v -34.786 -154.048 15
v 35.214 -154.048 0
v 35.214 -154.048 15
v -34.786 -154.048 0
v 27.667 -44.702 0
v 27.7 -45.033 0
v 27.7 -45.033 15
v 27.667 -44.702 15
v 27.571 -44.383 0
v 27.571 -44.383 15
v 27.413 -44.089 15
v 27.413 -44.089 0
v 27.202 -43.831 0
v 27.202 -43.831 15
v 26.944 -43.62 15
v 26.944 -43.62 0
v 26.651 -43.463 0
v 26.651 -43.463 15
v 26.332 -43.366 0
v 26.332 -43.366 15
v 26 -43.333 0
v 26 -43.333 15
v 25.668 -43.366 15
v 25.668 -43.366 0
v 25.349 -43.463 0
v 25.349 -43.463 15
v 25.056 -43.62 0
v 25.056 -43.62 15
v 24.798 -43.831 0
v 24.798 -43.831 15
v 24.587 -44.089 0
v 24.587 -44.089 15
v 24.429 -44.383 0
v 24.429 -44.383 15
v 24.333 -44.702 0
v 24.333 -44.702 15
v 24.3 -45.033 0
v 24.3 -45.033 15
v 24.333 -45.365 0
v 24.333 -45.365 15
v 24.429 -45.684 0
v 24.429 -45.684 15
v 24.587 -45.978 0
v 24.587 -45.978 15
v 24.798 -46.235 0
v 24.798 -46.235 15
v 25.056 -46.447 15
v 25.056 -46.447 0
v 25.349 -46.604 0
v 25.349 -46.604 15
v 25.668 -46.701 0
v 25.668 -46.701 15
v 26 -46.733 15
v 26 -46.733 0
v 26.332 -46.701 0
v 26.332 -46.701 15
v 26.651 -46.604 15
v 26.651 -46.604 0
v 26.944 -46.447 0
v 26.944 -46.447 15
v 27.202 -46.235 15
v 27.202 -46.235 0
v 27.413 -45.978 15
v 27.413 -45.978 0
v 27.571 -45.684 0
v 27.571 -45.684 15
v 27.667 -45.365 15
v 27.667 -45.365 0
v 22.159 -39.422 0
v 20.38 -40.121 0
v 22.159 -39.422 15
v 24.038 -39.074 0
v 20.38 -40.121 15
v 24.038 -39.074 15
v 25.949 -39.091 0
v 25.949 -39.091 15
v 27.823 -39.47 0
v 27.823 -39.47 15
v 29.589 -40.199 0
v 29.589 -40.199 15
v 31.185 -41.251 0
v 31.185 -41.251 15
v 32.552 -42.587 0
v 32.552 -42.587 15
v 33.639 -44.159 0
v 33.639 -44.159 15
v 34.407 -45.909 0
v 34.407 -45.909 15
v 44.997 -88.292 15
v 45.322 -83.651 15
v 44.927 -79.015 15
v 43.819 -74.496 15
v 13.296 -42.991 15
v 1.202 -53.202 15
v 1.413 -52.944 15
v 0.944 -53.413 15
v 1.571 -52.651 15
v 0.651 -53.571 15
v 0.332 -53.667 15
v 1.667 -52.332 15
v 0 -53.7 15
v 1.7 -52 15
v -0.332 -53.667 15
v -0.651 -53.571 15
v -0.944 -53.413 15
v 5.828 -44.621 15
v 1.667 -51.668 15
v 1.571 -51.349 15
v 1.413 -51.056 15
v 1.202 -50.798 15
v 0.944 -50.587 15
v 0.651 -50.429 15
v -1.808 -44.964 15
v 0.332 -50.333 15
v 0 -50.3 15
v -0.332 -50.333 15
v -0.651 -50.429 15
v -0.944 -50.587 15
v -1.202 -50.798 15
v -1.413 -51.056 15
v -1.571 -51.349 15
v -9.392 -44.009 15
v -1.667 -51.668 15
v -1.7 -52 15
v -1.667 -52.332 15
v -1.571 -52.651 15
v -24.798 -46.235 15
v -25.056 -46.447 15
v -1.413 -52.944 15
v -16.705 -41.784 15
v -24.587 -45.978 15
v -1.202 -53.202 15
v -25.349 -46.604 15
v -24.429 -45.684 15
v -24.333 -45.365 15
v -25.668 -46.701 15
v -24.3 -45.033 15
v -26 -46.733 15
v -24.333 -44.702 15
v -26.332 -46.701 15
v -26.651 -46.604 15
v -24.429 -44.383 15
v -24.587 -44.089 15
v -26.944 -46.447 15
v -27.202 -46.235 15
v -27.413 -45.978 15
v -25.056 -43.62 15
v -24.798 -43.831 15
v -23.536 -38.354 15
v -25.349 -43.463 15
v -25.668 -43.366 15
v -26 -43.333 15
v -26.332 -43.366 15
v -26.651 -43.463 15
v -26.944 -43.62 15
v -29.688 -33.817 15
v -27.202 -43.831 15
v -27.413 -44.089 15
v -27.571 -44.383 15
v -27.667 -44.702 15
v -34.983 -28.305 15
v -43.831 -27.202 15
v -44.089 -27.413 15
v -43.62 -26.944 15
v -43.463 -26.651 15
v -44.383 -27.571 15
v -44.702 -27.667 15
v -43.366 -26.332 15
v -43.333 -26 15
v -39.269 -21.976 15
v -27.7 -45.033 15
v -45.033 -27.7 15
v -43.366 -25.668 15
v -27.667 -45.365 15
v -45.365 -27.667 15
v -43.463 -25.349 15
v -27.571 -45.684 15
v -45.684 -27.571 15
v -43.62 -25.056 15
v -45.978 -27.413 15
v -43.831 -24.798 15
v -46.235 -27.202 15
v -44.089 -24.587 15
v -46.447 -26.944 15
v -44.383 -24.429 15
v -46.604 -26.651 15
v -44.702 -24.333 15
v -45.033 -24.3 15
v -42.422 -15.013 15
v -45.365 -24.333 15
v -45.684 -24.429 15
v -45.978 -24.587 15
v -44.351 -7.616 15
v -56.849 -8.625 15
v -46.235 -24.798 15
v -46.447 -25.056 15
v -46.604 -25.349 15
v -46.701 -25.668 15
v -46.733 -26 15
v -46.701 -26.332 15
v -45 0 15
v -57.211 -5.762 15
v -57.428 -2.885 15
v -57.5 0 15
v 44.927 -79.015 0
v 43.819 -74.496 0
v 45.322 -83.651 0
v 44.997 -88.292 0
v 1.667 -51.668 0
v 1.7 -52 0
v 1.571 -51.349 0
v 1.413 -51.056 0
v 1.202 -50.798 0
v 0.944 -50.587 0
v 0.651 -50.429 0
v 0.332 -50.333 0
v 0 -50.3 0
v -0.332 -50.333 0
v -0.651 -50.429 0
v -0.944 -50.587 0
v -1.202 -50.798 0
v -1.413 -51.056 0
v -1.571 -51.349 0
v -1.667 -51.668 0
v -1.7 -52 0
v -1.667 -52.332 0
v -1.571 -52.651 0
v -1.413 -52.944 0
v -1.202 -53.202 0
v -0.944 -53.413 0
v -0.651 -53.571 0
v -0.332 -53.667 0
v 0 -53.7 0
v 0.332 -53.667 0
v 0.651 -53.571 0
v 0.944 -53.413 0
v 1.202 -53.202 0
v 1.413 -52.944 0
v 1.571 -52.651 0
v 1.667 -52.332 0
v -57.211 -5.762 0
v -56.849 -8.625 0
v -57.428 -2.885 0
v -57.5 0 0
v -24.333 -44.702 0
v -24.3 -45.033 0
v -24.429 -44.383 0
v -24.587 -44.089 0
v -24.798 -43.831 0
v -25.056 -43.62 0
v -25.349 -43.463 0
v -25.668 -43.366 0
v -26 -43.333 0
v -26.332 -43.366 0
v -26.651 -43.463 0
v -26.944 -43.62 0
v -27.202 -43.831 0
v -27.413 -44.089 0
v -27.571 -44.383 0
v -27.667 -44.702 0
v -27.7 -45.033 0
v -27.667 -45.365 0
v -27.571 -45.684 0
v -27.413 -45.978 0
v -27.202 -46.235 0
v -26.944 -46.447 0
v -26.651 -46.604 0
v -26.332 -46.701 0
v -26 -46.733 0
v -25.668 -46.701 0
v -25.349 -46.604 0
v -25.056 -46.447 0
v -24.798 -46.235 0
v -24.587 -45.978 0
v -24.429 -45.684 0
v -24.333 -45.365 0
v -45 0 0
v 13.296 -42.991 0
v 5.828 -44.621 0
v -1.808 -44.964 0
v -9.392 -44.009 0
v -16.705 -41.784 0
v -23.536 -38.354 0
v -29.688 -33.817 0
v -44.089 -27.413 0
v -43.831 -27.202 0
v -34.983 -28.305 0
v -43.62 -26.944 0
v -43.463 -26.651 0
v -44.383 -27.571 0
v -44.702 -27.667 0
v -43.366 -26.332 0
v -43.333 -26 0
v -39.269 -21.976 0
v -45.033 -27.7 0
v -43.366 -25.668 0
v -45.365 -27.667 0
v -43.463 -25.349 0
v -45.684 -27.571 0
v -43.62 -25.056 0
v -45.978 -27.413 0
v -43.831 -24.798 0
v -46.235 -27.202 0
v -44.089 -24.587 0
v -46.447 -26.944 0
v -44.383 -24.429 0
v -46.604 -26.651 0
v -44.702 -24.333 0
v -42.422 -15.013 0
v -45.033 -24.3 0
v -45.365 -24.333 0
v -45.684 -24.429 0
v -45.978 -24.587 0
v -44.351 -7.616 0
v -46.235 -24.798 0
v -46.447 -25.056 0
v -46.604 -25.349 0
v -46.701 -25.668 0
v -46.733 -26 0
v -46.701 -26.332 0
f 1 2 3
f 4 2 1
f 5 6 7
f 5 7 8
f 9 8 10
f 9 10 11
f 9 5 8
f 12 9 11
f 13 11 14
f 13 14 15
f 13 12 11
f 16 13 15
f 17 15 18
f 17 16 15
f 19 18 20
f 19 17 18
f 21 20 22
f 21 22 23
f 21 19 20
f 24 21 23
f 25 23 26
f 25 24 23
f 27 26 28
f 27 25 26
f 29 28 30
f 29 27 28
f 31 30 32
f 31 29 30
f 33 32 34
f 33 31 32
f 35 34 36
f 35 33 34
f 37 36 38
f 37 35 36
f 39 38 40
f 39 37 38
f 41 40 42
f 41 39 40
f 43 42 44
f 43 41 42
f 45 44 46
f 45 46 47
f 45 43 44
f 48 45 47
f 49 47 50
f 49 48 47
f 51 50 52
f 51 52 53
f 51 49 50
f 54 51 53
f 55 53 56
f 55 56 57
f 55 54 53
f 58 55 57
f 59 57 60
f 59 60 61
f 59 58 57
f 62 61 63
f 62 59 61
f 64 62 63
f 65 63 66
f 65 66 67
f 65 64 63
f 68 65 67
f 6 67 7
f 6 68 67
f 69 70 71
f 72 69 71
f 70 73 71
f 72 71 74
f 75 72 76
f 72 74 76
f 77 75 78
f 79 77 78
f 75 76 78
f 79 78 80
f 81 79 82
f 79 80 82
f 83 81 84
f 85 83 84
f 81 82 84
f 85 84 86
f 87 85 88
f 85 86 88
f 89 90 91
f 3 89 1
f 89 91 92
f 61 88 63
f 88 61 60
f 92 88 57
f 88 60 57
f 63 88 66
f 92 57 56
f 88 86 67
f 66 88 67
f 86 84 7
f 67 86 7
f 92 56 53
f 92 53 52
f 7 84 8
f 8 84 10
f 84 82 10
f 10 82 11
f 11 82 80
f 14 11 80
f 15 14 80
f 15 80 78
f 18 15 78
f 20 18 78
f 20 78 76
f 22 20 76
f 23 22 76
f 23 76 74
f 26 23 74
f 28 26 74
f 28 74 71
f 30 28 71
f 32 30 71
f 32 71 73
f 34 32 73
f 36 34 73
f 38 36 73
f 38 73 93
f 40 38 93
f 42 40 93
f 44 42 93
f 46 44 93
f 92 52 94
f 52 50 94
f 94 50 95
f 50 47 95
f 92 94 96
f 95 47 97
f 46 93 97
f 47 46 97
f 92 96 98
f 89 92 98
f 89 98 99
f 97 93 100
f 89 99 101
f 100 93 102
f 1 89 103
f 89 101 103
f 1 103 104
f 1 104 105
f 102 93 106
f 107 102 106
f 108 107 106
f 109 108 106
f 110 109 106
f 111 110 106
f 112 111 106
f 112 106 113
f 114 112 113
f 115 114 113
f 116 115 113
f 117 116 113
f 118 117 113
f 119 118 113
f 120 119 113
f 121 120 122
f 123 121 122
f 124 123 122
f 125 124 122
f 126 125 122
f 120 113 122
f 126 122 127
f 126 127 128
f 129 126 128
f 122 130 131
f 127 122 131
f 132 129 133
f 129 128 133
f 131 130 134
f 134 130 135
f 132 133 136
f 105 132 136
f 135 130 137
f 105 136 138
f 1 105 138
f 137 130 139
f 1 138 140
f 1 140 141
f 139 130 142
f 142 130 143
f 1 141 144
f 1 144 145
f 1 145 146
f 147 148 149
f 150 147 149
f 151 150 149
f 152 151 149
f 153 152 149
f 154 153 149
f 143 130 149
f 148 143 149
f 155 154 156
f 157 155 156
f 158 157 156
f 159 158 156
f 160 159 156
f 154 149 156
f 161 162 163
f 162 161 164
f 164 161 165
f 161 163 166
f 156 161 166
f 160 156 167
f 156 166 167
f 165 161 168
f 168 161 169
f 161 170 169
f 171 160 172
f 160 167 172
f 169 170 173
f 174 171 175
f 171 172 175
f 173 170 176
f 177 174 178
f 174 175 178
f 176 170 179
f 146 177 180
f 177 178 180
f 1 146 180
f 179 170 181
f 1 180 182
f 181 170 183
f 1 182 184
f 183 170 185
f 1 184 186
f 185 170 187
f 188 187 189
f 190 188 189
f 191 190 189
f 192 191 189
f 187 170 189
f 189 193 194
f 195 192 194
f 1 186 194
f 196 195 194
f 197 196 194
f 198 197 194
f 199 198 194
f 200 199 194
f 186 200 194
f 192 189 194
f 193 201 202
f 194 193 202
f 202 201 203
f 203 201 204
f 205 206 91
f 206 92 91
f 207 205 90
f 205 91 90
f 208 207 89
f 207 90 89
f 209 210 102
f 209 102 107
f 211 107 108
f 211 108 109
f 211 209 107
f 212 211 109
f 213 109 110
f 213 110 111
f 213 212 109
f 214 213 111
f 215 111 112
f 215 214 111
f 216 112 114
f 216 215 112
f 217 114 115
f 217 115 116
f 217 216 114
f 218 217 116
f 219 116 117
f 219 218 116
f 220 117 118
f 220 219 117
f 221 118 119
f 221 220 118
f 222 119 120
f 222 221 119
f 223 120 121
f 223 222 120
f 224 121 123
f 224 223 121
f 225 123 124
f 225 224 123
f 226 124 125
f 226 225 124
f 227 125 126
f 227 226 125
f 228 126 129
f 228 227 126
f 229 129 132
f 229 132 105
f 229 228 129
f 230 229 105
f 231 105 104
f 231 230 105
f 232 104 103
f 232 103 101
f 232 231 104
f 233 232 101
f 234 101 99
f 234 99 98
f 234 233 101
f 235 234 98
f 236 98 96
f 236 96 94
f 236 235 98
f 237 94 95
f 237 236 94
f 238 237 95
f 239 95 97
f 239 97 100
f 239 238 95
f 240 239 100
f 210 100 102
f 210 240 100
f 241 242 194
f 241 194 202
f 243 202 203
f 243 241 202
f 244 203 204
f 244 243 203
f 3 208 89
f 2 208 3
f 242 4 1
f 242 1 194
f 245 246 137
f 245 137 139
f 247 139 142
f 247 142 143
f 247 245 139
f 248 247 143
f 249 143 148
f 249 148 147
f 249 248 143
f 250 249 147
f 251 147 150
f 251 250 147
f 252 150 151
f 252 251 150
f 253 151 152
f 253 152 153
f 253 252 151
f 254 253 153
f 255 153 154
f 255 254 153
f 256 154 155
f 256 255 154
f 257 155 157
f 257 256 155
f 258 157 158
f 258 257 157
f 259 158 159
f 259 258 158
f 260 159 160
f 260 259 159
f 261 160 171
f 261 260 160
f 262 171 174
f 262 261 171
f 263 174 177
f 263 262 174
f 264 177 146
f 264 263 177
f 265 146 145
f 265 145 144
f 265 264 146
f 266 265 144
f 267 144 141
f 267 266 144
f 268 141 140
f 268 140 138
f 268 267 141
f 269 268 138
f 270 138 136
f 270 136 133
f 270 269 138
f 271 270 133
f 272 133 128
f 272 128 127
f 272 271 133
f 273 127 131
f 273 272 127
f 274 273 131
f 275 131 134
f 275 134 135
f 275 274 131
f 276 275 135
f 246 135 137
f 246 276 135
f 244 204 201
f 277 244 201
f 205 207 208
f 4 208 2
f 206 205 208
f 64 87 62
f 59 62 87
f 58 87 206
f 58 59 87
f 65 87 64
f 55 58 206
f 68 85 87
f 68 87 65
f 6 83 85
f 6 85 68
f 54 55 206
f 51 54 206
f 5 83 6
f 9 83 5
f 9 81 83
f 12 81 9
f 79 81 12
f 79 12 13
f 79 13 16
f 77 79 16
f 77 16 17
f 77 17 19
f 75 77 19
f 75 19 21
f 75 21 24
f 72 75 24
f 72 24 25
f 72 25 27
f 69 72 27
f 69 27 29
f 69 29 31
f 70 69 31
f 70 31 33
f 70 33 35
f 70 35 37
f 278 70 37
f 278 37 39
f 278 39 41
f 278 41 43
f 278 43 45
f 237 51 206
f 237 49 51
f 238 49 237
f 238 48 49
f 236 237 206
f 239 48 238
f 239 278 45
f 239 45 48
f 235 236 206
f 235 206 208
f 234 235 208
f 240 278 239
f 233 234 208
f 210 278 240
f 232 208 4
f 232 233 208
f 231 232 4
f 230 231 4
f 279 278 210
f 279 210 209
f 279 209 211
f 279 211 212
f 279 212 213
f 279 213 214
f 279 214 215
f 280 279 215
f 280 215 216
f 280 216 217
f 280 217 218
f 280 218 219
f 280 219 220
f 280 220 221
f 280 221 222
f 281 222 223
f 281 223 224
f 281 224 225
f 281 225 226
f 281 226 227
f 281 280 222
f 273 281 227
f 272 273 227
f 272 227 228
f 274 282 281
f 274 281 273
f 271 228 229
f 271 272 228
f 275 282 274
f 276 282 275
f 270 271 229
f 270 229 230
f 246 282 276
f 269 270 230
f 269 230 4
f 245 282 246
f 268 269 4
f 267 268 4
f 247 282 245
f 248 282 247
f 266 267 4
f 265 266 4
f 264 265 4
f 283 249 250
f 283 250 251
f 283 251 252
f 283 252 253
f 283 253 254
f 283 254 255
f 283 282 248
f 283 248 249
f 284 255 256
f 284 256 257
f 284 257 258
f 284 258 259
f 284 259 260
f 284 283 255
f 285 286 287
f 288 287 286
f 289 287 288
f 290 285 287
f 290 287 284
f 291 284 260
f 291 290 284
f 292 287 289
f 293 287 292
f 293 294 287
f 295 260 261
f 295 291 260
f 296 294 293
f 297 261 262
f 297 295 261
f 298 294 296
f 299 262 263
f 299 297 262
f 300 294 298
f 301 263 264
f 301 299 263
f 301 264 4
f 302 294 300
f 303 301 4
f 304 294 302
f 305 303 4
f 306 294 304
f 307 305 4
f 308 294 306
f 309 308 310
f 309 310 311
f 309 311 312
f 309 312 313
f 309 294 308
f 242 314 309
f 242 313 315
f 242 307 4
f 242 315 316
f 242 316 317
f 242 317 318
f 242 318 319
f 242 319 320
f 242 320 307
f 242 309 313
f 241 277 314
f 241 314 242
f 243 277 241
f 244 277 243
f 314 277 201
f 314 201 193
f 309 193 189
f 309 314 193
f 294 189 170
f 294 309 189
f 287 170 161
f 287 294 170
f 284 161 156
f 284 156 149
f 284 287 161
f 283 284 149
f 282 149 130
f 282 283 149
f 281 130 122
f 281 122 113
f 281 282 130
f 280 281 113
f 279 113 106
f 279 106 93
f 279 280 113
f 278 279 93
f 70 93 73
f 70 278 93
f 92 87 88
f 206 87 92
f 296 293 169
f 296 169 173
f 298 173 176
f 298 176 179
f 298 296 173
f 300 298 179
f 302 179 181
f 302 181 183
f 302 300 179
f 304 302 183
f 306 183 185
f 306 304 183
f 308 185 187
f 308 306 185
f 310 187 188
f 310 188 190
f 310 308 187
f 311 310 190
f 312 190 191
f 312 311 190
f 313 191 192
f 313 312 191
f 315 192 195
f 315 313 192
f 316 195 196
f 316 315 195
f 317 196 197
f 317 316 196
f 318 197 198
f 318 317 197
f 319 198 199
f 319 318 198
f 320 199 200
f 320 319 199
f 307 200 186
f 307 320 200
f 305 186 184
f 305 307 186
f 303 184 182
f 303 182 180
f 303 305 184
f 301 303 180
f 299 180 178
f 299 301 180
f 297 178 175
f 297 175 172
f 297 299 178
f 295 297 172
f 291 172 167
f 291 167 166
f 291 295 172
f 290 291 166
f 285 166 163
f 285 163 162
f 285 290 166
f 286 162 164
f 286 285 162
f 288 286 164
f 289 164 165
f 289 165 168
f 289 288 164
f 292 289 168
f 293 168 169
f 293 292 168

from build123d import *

# Parameters (mm, degrees)
SKETCH1_R           = 1.7
BOSS_EXTRUDE1_DEPTH = 15
FILLET1_R           = 10
FILLET2_R           = 30


with BuildPart() as part:
    # Sketch1 → Boss-Extrude1 (new body)
    with BuildSketch(Plane.XY):
        with BuildLine():
            Line((-57.5, 0), (-45, 0))
            ThreePointArc((-45, 0), (-18.212102581, -41.149961356), (30.258636425, -33.307880775))
            Line((30.258636425, -33.307880775), (46.0437747, -81.254716073))
            Line((46.0437747, -81.254716073), (35.213577586, -154.047675233))
            Line((35.213577586, -154.047675233), (-34.786422414, -154.047675233))
            Line((-34.786422414, -154.047675233), (-56.849444808, -8.625))
            ThreePointArc((-56.849444808, -8.625), (-57.337130537, -4.324749908), (-57.5, 0))
        make_face()
        with Locations((0, -52)):
            Circle(SKETCH1_R, mode=Mode.SUBTRACT)
        with Locations((-26, -45.033320997)):
            Circle(SKETCH1_R, mode=Mode.SUBTRACT)
        with Locations((-45.033320997, -26)):
            Circle(SKETCH1_R, mode=Mode.SUBTRACT)
        with Locations((26, -45.033320997)):
            Circle(SKETCH1_R, mode=Mode.SUBTRACT)
    extrude(amount=BOSS_EXTRUDE1_DEPTH)

    # Fillet1
    fillet1_edges = [part.edges().sort_by_distance(p)[0] for p in [
        (30.258636425, -33.307880775, 7.5),
    ]]
    fillet(fillet1_edges, radius=FILLET1_R)

    # Fillet2
    fillet2_edges = [part.edges().sort_by_distance(p)[0] for p in [
        (46.0437747, -81.254716073, 7.5),
    ]]
    fillet(fillet2_edges, radius=FILLET2_R)


solid = part.part
